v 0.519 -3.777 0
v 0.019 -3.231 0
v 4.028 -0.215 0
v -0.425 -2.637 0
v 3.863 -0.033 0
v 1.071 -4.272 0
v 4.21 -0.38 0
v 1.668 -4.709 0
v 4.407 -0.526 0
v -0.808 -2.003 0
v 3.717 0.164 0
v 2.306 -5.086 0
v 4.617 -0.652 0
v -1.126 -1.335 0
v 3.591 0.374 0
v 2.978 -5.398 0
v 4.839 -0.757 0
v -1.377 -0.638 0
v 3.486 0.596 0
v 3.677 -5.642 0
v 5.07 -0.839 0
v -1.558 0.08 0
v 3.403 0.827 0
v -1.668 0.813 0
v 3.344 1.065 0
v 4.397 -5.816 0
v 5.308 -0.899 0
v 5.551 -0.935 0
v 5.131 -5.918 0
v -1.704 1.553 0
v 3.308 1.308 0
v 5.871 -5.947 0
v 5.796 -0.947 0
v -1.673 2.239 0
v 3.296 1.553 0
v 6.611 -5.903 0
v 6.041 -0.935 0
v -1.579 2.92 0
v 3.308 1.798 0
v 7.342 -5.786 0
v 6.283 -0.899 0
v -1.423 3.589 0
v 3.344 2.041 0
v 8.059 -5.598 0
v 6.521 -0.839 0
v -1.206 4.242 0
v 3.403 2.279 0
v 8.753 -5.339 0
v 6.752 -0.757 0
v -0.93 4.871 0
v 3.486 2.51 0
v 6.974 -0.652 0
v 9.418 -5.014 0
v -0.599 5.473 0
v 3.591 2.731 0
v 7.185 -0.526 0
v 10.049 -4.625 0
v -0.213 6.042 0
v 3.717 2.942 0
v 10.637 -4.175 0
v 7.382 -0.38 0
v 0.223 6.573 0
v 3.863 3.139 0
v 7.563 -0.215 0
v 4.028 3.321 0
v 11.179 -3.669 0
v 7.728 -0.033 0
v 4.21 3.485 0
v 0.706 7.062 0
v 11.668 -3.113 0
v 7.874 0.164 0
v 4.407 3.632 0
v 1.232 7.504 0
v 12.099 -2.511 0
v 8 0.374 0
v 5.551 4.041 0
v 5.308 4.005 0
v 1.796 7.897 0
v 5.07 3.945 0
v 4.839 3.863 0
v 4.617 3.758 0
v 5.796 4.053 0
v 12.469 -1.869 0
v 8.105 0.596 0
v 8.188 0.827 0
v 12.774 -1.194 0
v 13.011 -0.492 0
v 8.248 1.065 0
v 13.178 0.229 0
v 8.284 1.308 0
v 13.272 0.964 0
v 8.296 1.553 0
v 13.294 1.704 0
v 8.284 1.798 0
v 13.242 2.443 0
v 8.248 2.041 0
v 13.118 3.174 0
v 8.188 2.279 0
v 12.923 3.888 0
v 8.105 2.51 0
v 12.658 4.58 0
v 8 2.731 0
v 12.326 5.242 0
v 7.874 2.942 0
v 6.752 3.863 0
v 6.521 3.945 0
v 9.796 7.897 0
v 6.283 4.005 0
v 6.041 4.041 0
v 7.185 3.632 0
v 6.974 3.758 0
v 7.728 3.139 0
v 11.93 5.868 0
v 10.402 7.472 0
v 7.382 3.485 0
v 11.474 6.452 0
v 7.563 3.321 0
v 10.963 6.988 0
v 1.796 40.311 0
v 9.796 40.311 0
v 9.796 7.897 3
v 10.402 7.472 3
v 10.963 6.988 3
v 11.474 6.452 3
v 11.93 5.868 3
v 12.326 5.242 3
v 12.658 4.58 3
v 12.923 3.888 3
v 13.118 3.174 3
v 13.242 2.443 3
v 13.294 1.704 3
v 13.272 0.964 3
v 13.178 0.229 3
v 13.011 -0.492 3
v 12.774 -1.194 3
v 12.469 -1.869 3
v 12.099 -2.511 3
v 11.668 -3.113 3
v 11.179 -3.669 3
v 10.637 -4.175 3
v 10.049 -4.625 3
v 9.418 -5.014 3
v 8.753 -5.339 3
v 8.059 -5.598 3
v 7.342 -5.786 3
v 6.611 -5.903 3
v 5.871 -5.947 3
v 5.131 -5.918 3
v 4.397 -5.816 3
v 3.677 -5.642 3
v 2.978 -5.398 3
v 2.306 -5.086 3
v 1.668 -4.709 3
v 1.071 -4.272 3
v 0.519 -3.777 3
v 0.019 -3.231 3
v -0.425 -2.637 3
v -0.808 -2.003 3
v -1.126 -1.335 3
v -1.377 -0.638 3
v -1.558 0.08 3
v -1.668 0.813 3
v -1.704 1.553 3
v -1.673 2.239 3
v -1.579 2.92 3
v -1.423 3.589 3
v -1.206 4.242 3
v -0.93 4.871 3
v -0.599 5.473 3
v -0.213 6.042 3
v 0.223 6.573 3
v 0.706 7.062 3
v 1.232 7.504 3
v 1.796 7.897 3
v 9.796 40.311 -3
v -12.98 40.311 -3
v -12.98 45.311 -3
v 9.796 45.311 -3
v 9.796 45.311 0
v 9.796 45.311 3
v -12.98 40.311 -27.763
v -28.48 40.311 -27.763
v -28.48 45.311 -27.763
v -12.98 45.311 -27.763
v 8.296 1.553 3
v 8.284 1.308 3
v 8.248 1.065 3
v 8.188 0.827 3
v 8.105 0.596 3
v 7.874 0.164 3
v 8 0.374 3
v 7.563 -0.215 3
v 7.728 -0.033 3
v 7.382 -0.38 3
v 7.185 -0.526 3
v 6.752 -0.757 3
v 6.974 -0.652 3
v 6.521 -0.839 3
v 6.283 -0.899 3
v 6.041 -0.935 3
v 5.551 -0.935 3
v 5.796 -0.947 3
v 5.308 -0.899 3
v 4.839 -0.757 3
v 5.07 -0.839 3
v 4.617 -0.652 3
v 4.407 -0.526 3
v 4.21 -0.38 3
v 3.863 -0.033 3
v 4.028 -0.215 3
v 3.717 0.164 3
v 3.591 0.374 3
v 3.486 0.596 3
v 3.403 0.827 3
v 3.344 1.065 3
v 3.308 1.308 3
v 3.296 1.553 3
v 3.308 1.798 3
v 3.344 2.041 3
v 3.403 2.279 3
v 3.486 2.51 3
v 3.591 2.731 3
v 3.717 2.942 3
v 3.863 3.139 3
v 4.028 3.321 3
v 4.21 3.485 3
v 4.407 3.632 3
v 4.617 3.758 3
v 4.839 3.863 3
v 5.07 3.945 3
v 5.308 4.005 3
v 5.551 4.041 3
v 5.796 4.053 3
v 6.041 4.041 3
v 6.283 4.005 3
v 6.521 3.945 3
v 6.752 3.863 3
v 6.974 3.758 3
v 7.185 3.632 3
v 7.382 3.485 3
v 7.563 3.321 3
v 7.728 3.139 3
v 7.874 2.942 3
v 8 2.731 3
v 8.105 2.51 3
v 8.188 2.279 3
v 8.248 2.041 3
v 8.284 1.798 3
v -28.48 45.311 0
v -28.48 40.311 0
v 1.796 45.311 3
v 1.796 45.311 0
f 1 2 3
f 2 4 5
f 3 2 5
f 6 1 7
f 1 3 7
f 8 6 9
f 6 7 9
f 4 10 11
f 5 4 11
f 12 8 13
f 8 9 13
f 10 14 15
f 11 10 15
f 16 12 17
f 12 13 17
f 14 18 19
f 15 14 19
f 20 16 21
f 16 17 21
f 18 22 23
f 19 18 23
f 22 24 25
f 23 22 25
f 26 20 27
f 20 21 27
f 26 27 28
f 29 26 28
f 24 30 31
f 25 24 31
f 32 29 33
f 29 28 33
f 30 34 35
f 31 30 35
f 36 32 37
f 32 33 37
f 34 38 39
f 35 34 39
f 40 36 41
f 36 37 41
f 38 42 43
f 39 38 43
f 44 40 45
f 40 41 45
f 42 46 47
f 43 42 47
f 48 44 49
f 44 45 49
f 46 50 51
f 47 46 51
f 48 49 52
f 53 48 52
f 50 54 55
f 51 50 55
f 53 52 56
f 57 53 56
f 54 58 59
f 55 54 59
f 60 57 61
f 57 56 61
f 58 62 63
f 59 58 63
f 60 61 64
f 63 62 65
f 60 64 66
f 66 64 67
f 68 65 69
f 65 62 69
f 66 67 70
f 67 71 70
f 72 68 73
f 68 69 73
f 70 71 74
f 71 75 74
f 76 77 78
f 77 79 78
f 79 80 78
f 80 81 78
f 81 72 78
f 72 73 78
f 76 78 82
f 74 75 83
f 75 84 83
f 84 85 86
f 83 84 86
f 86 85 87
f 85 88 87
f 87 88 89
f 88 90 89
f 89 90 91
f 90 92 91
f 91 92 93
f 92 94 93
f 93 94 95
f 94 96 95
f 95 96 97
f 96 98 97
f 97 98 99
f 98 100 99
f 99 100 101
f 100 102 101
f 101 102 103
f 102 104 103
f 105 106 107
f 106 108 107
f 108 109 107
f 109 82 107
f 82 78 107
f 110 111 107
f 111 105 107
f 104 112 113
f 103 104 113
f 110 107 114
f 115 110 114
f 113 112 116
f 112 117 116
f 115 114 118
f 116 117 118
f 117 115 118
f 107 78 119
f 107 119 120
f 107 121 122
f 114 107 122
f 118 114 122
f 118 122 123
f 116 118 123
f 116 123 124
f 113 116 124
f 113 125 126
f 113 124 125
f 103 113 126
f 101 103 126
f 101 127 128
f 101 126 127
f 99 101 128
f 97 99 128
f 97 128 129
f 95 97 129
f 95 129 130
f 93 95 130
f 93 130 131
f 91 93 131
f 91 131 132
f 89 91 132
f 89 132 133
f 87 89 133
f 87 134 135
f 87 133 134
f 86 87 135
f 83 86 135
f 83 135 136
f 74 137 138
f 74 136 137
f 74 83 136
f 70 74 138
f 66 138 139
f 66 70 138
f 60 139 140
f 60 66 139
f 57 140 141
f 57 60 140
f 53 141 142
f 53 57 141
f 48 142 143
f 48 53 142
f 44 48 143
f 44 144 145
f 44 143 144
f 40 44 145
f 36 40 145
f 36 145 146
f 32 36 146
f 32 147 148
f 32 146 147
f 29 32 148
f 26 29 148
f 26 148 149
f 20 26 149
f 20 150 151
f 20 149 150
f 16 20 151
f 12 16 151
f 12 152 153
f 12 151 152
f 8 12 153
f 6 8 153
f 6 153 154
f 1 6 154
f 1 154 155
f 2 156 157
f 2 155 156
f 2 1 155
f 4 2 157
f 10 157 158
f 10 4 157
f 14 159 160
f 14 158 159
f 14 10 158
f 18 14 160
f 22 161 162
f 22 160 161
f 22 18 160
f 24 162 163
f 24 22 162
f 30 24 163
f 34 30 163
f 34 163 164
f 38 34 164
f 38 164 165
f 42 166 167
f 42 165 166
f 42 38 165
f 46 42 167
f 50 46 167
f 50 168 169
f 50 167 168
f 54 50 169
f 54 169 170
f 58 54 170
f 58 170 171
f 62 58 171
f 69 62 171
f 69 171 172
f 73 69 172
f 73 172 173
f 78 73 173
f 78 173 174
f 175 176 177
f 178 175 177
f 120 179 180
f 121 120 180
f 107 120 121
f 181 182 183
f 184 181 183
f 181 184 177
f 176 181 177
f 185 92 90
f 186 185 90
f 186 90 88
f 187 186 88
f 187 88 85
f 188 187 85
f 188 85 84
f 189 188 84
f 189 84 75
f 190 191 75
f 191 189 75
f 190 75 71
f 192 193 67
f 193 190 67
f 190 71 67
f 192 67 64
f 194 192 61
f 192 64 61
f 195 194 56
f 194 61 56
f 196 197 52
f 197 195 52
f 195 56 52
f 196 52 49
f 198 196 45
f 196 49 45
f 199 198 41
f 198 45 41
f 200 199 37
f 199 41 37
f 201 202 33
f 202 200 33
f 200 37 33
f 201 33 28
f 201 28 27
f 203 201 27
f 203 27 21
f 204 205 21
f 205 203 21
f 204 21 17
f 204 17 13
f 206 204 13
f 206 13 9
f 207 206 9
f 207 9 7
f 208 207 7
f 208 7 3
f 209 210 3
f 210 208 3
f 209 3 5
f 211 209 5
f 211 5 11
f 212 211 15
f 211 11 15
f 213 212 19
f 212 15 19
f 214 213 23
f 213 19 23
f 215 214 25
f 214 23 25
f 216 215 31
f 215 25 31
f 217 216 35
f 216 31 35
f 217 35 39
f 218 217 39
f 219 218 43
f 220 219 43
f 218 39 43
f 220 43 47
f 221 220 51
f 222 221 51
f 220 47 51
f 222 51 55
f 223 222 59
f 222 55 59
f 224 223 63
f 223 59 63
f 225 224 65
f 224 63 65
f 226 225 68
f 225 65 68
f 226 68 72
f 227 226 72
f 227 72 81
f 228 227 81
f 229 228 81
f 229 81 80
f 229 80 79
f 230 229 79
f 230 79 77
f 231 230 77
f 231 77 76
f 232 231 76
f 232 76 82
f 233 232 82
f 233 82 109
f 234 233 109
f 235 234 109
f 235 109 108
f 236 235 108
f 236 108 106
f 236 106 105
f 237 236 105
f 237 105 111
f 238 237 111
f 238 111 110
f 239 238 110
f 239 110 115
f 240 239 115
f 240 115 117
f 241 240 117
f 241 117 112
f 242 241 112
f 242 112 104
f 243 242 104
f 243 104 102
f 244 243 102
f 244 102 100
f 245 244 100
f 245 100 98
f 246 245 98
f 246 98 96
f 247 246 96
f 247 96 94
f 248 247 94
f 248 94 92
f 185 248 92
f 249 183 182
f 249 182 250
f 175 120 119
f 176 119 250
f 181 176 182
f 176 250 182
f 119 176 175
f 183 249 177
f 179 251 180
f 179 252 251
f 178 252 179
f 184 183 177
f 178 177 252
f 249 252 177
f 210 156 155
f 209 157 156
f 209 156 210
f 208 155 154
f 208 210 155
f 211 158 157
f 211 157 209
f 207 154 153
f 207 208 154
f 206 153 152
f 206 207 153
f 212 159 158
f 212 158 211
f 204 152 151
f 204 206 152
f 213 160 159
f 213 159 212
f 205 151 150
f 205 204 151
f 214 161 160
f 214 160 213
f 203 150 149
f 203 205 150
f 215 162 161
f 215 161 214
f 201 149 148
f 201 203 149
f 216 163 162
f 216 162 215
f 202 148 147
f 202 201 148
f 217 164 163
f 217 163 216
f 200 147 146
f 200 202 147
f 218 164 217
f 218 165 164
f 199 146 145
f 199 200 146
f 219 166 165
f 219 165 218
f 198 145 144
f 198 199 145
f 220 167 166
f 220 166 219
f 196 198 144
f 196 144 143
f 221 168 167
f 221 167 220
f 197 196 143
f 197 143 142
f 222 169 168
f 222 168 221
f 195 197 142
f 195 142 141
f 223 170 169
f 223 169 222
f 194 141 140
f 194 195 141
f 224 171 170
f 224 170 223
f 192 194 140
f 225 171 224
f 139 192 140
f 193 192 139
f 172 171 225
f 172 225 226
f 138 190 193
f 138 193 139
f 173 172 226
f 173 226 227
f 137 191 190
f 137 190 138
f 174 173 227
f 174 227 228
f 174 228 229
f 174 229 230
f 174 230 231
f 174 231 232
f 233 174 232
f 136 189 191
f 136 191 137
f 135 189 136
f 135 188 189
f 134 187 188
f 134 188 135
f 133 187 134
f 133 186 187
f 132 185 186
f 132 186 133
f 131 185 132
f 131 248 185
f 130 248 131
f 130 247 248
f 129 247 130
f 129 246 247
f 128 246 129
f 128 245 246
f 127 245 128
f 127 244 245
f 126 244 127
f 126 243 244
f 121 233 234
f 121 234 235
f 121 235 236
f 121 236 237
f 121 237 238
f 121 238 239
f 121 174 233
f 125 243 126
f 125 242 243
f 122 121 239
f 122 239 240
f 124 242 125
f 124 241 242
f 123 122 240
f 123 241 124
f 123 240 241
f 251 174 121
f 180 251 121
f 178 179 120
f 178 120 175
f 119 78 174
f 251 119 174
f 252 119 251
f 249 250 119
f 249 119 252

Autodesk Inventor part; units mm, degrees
ref_plane "YZ Plane" through (0, 0, 0) normal (1, 0, 0) x (0, 1, 0)
ref_plane "XZ Plane" through (0, 0, 0) normal (0, 1, 0) x (-1, 0, 0)
sketch "Sketch1" plane through (0, 0, 0) normal (0, 0, 1) x (1, 0, 0)
  line L0 (6.9956, 3.6314) -> (6.4167, 3.8711) projected
  line L1 (5.7956, 3.9529) -> (6.4167, 3.8711) projected
  line L2 (5.1744, 3.8711) -> (5.7956, 3.9529) projected
  line L3 (4.5956, 3.6314) -> (5.1744, 3.8711) projected
  line L4 (4.0985, 3.25) -> (4.5956, 3.6314) projected
  line L5 (3.7171, 2.7529) -> (4.0985, 3.25) projected
  line L6 (3.4773, 2.1741) -> (3.7171, 2.7529) projected
  line L7 (3.4773, 2.1741) -> (3.3956, 1.5529) projected
  line L8 (3.4773, 0.9317) -> (3.3956, 1.5529) projected
  line L9 (3.4773, 0.9317) -> (3.7171, 0.3529) projected
  line L10 (3.7171, 0.3529) -> (4.0985, -0.1441) projected
  line L11 (4.0985, -0.1441) -> (4.5956, -0.5255) projected
  line L12 (4.5956, -0.5255) -> (5.1744, -0.7653) projected
  line L13 (5.1744, -0.7653) -> (5.7956, -0.8471) projected
  line L14 (5.7956, -0.8471) -> (6.4167, -0.7653) projected
  line L15 (6.4167, -0.7653) -> (6.9956, -0.5255) projected
  line L16 (6.9956, -0.5255) -> (7.4926, -0.1441) projected
  line L17 (7.4926, -0.1441) -> (7.874, 0.3529) projected
  line L18 (8.1138, 0.9317) -> (7.874, 0.3529) projected
  line L19 (8.1138, 0.9317) -> (8.1956, 1.5529) projected
  line L20 (8.1956, 1.5529) -> (8.1138, 2.1741) projected
  line L21 (8.1138, 2.1741) -> (7.874, 2.7529) projected
  line L22 (7.874, 2.7529) -> (7.4926, 3.25) projected
  line L23 (6.9956, 3.6314) -> (7.4926, 3.25) projected
  line L24 (6.7956, 1.5529) -> (6.7615, 1.8117) projected
  line L25 (6.7615, 1.2941) -> (6.7956, 1.5529) projected
  line L26 (6.6616, 1.0529) -> (6.7615, 1.2941) projected
  line L27 (6.5027, 0.8458) -> (6.6616, 1.0529) projected
  line L28 (6.2956, 0.6869) -> (6.5027, 0.8458) projected
  line L29 (6.0544, 0.587) -> (6.2956, 0.6869) projected
  line L30 (5.7956, 0.5529) -> (6.0544, 0.587) projected
  line L31 (5.5367, 0.587) -> (5.7956, 0.5529) projected
  line L32 (5.2956, 0.6869) -> (5.5367, 0.587) projected
  line L33 (5.0884, 0.8458) -> (5.2956, 0.6869) projected
  line L34 (4.9295, 1.0529) -> (5.0884, 0.8458) projected
  line L35 (4.8296, 1.2941) -> (4.9295, 1.0529) projected
  line L36 (4.7956, 1.5529) -> (4.8296, 1.2941) projected
  line L37 (4.7956, 1.5529) -> (4.8296, 1.8117) projected
  line L38 (4.8296, 1.8117) -> (4.9295, 2.0529) projected
  line L39 (4.9295, 2.0529) -> (5.0884, 2.26) projected
  line L40 (5.0884, 2.26) -> (5.2956, 2.4189) projected
  line L41 (5.2956, 2.4189) -> (5.5367, 2.5188) projected
  line L42 (5.5367, 2.5188) -> (5.7956, 2.5529) projected
  line L43 (5.7956, 2.5529) -> (6.0544, 2.5188) projected
  line L44 (6.0544, 2.5188) -> (6.2956, 2.4189) projected
  line L45 (6.2956, 2.4189) -> (6.5027, 2.26) projected
  line L46 (6.5027, 2.26) -> (6.6616, 2.0529) projected
  line L47 (6.6616, 2.0529) -> (6.7615, 1.8117) projected
  circle A0 centre (5.7956, 1.5529) radius 2.5
  arc A1 (1.7956, 7.8972) -> (9.7955, 7.8972) centre (5.7956, 1.5529) ccw
  line L48 (-28.4804, 55.5109) -> (-15.9804, 55.5109) projected
  line L49 (-28.4804, 55.5109) -> (-28.4804, 40.3109) projected
  line L50 (-15.9804, 40.3109) -> (-28.4804, 40.3109) projected
  line L51 (-15.9804, 40.3109) -> (-15.9804, 55.5109) projected
  line L52 (-20.6474, 51.7815) -> (-20.6304, 51.9109) projected
  line L53 (-20.6974, 51.6609) -> (-20.6474, 51.7815) projected
  line L54 (-20.7768, 51.5573) -> (-20.6974, 51.6609) projected
  line L55 (-20.8804, 51.4779) -> (-20.7768, 51.5573) projected
  line L56 (-21.001, 51.4279) -> (-20.8804, 51.4779) projected
  line L57 (-21.1304, 51.4109) -> (-21.001, 51.4279) projected
  line L58 (-21.2598, 51.4279) -> (-21.1304, 51.4109) projected
  line L59 (-21.3804, 51.4779) -> (-21.2598, 51.4279) projected
  line L60 (-21.4839, 51.5573) -> (-21.3804, 51.4779) projected
  line L61 (-21.5634, 51.6609) -> (-21.4839, 51.5573) projected
  line L62 (-21.5634, 51.6609) -> (-21.6133, 51.7815) projected
  line L63 (-21.6133, 51.7815) -> (-21.6304, 51.9109) projected
  line L64 (-21.6304, 51.9109) -> (-21.6133, 52.0403) projected
  line L65 (-21.5634, 52.1609) -> (-21.6133, 52.0403) projected
  line L66 (-21.4839, 52.2645) -> (-21.5634, 52.1609) projected
  line L67 (-21.3804, 52.3439) -> (-21.4839, 52.2645) projected
  line L68 (-21.3804, 52.3439) -> (-21.2598, 52.3939) projected
  line L69 (-21.2598, 52.3939) -> (-21.1304, 52.4109) projected
  line L70 (-21.1304, 52.4109) -> (-21.001, 52.3939) projected
  line L71 (-21.001, 52.3939) -> (-20.8804, 52.3439) projected
  line L72 (-20.8804, 52.3439) -> (-20.7768, 52.2645) projected
  line L73 (-20.7768, 52.2645) -> (-20.6974, 52.1609) projected
  line L74 (-20.6974, 52.1609) -> (-20.6474, 52.0403) projected
  line L75 (-20.6304, 51.9109) -> (-20.6474, 52.0403) projected
  line L76 (-21.7474, 51.7815) -> (-21.7304, 51.9109) projected
  line L77 (-21.7974, 51.6609) -> (-21.7474, 51.7815) projected
  line L78 (-21.8768, 51.5573) -> (-21.7974, 51.6609) projected
  line L79 (-21.9804, 51.4779) -> (-21.8768, 51.5573) projected
  line L80 (-22.101, 51.4279) -> (-21.9804, 51.4779) projected
  line L81 (-22.2304, 51.4109) -> (-22.101, 51.4279) projected
  line L82 (-22.3598, 51.4279) -> (-22.2304, 51.4109) projected
  line L83 (-22.4804, 51.4779) -> (-22.3598, 51.4279) projected
  line L84 (-22.5839, 51.5573) -> (-22.4804, 51.4779) projected
  line L85 (-22.6634, 51.6609) -> (-22.5839, 51.5573) projected
  line L86 (-22.6634, 51.6609) -> (-22.7133, 51.7815) projected
  line L87 (-22.7133, 51.7815) -> (-22.7304, 51.9109) projected
  line L88 (-22.7304, 51.9109) -> (-22.7133, 52.0403) projected
  line L89 (-22.6634, 52.1609) -> (-22.7133, 52.0403) projected
  line L90 (-22.5839, 52.2645) -> (-22.6634, 52.1609) projected
  line L91 (-22.4804, 52.3439) -> (-22.5839, 52.2645) projected
  line L92 (-22.4804, 52.3439) -> (-22.3598, 52.3939) projected
  line L93 (-22.3598, 52.3939) -> (-22.2304, 52.4109) projected
  line L94 (-22.2304, 52.4109) -> (-22.101, 52.3939) projected
  line L95 (-22.101, 52.3939) -> (-21.9804, 52.3439) projected
  line L96 (-21.9804, 52.3439) -> (-21.8768, 52.2645) projected
  line L97 (-21.8768, 52.2645) -> (-21.7974, 52.1609) projected
  line L98 (-21.7974, 52.1609) -> (-21.7474, 52.0403) projected
  line L99 (-21.7304, 51.9109) -> (-21.7474, 52.0403) projected
  line L100 (-22.8474, 51.7815) -> (-22.8304, 51.9109) projected
  line L101 (-22.8974, 51.6609) -> (-22.8474, 51.7815) projected
  line L102 (-22.9768, 51.5573) -> (-22.8974, 51.6609) projected
  line L103 (-23.0804, 51.4779) -> (-22.9768, 51.5573) projected
  line L104 (-23.201, 51.4279) -> (-23.0804, 51.4779) projected
  line L105 (-23.3304, 51.4109) -> (-23.201, 51.4279) projected
  line L106 (-23.4598, 51.4279) -> (-23.3304, 51.4109) projected
  line L107 (-23.5804, 51.4779) -> (-23.4598, 51.4279) projected
  line L108 (-23.6839, 51.5573) -> (-23.5804, 51.4779) projected
  line L109 (-23.7634, 51.6609) -> (-23.6839, 51.5573) projected
  line L110 (-23.7634, 51.6609) -> (-23.8133, 51.7815) projected
  line L111 (-23.8133, 51.7815) -> (-23.8304, 51.9109) projected
  line L112 (-23.8304, 51.9109) -> (-23.8133, 52.0403) projected
  line L113 (-23.7634, 52.1609) -> (-23.8133, 52.0403) projected
  line L114 (-23.6839, 52.2645) -> (-23.7634, 52.1609) projected
  line L115 (-23.5804, 52.3439) -> (-23.6839, 52.2645) projected
  line L116 (-23.5804, 52.3439) -> (-23.4598, 52.3939) projected
  line L117 (-23.4598, 52.3939) -> (-23.3304, 52.4109) projected
  line L118 (-23.3304, 52.4109) -> (-23.201, 52.3939) projected
  line L119 (-23.201, 52.3939) -> (-23.0804, 52.3439) projected
  line L120 (-23.0804, 52.3439) -> (-22.9768, 52.2645) projected
  line L121 (-22.9768, 52.2645) -> (-22.8974, 52.1609) projected
  line L122 (-22.8974, 52.1609) -> (-22.8474, 52.0403) projected
  line L123 (-22.8304, 51.9109) -> (-22.8474, 52.0403) projected
  line L124 (-21.6304, 37.8109) -> (-21.6304, 40.3109) projected
  line L125 (-15.9804, 37.8109) -> (-21.6304, 37.8109) projected
  line L126 (-15.9804, 37.8109) -> (-15.9804, 40.3109) projected
  line L127 (-21.6304, 40.3109) -> (-15.9804, 40.3109) projected
  line L128 (-28.4804, 37.8109) -> (-28.4804, 40.3109) projected
  line L129 (-22.8304, 37.8109) -> (-28.4804, 37.8109) projected
  line L130 (-22.8304, 37.8109) -> (-22.8304, 40.3109) projected
  line L131 (-28.4804, 40.3109) -> (-22.8304, 40.3109) projected
  line L132 (-28.4804, 40.3109) -> (-15.9804, 40.3109)
  line L133 (-15.9804, 40.3109) -> (-15.9804, 45.3109)
  line L134 (-15.9804, 45.3109) -> (-28.4804, 45.3109)
  line L135 (-28.4804, 45.3109) -> (-28.4804, 40.3109)
  line L136 (-15.9804, 45.3109) -> (-12.9804, 45.3109)
  line L137 (-12.9804, 45.3109) -> (-12.9804, 40.3109)
  line L138 (-12.9804, 40.3109) -> (-15.9804, 40.3109)
  line L139 (-15.9804, 40.3109) -> (-15.9804, 45.3109)
  line L140 (-28.4804, 45.3109) -> (-31.4804, 45.3109)
  line L141 (-31.4804, 45.3109) -> (-31.4804, 40.3109)
  line L142 (-31.4804, 40.3109) -> (-28.4804, 40.3109)
  line L143 (-28.4804, 40.3109) -> (-28.4804, 45.3109)
  line L144 (-12.9804, 45.3109) -> (5.7956, 45.3109)
  line L145 (1.7956, 40.3109) -> (-12.9804, 40.3109)
  line L146 (-12.9804, 40.3109) -> (-12.9804, 45.3109)
  line L147 (9.7956, 45.3109) -> (9.7955, 7.8972)
  line L148 (1.7956, 7.8972) -> (1.7956, 40.3109)
  line L149 (1.7956, 45.3109) -> (9.7956, 45.3109)
  line L150 (9.7956, 45.3109) -> (1.7956, 3.9529) construction
  line L151 (9.7956, 3.9529) -> (1.7956, 45.3109) construction
  line L152 (5.7956, 4.0529) -> (5.7956, 3.9529)
  line L153 (5.7956, 1.5529) -> (-36.8703, 1.5529)
  line L154 (-22.2304, 45.3109) -> (-22.2304, 1.5529)
  line L155 (1.7956, 39.0609) -> (1.7956, 45.3109)
  point P0 (0, 0)
  point P1 (5.7956, 24.6319)
  dimension "d0" = 5
  dimension "d1" = 15
  dimension "d2" = 5
  dimension "d3" = 3
  dimension "d4" = 3
  dimension "d6" = 8
extrude "Extrusion1" add sketch "Sketch1" along normal blind 3 contours A1 L148 L155 L144 L149 L147
sketch "Sketch2" plane through (1.7956, 39.0609, 0) normal (-1, 0, 0) x (0, 0, 1)
  line L0 (-5.2631, 16.45) -> (-5.2631, 1.25) projected
  line L1 (-27.7631, 1.25) -> (-27.7631, 16.45) projected
  line L2 (-5.2631, 16.45) -> (-27.7631, 16.45) projected
  line L3 (-27.7631, 1.25) -> (-27.7631, 16.45) projected
  line L4 (-27.7631, 1.25) -> (-32.5631, 1.25) projected
  line L5 (-32.5631, 1.25) -> (-32.5631, -1.25) projected
  line L6 (-27.7631, -1.25) -> (-32.5631, -1.25) projected
  line L7 (-27.7631, -1.25) -> (-27.7631, -5.75) projected
  line L8 (-5.2631, -5.75) -> (-27.7631, -5.75) projected
  line L9 (-5.2631, -1.25) -> (-5.2631, -5.75) projected
  line L10 (-5.2631, -1.25) -> (-0.4631, -1.25) projected
  line L11 (-0.4631, -1.25) -> (-0.4631, 1.25) projected
  line L12 (-5.2631, 1.25) -> (-0.4631, 1.25) projected
  line L13 (-5.2631, 16.45) -> (-5.2631, 1.25) projected
  line L14 (0, 6.25) -> (0, 0) projected
  line L15 (-27.7631, 1.25) -> (0, 1.25)
  line L16 (0, 1.25) -> (0, 6.25)
  line L17 (0, 6.25) -> (-27.7631, 6.25)
  line L18 (-27.7631, 6.25) -> (-27.7631, 1.25)
  line L19 (-27.7631, 6.25) -> (-30.7631, 6.25)
  line L20 (-30.7631, 6.25) -> (-30.7631, 1.25)
  line L21 (-30.7631, 1.25) -> (-27.7631, 1.25)
  line L22 (-27.7631, 1.25) -> (-27.7631, 6.25)
  point P0 (0, -39.0609)
  dimension "d9" = 3
ref_plane "Work Plane1" through (-28.4804, 33.3109, -32.5631) normal (-1, 0, 0) x (0, 0, 1)
extrude "Extrusion2" add sketch "Sketch2" against normal blind 15.5 from surface at 30.276 contours L17 L14 L15 L12 L0 | L0 L15 L1 L17
sketch "Sketch3" plane through (-12.9804, 40.3109, 0) normal (1, 0, 0) x (0, 0, -1)
  line L0 (0, -32.4137) -> (0, 5) projected
  line L1 (0, 5) -> (-3, 5) projected
  line L2 (-3, -32.4137) -> (-3, 5) projected
  line L3 (0, -32.4137) -> (-3, -32.4137) projected
  line L4 (0, 5) -> (0, 0) projected
  line L5 (0, 0) -> (27.7631, 0) projected
  line L6 (27.7631, 0) -> (27.7631, 5) projected
  line L7 (27.7631, 5) -> (0, 5) projected
  line L8 (27.7631, 5) -> (0, 5) projected
  line L9 (0, 0) -> (3, 0)
  line L10 (3, 0) -> (3, 5)
  line L11 (3, 5) -> (0, 5)
  line L12 (0, 5) -> (0, 0)
  point P0 (0, -40.3109)
  dimension "d12" = 3
extrude "Extrusion3" add sketch "Sketch3" along normal up to surface (22.776 mm away) contours L0 L7 L10 L5
properties part number "armV"
